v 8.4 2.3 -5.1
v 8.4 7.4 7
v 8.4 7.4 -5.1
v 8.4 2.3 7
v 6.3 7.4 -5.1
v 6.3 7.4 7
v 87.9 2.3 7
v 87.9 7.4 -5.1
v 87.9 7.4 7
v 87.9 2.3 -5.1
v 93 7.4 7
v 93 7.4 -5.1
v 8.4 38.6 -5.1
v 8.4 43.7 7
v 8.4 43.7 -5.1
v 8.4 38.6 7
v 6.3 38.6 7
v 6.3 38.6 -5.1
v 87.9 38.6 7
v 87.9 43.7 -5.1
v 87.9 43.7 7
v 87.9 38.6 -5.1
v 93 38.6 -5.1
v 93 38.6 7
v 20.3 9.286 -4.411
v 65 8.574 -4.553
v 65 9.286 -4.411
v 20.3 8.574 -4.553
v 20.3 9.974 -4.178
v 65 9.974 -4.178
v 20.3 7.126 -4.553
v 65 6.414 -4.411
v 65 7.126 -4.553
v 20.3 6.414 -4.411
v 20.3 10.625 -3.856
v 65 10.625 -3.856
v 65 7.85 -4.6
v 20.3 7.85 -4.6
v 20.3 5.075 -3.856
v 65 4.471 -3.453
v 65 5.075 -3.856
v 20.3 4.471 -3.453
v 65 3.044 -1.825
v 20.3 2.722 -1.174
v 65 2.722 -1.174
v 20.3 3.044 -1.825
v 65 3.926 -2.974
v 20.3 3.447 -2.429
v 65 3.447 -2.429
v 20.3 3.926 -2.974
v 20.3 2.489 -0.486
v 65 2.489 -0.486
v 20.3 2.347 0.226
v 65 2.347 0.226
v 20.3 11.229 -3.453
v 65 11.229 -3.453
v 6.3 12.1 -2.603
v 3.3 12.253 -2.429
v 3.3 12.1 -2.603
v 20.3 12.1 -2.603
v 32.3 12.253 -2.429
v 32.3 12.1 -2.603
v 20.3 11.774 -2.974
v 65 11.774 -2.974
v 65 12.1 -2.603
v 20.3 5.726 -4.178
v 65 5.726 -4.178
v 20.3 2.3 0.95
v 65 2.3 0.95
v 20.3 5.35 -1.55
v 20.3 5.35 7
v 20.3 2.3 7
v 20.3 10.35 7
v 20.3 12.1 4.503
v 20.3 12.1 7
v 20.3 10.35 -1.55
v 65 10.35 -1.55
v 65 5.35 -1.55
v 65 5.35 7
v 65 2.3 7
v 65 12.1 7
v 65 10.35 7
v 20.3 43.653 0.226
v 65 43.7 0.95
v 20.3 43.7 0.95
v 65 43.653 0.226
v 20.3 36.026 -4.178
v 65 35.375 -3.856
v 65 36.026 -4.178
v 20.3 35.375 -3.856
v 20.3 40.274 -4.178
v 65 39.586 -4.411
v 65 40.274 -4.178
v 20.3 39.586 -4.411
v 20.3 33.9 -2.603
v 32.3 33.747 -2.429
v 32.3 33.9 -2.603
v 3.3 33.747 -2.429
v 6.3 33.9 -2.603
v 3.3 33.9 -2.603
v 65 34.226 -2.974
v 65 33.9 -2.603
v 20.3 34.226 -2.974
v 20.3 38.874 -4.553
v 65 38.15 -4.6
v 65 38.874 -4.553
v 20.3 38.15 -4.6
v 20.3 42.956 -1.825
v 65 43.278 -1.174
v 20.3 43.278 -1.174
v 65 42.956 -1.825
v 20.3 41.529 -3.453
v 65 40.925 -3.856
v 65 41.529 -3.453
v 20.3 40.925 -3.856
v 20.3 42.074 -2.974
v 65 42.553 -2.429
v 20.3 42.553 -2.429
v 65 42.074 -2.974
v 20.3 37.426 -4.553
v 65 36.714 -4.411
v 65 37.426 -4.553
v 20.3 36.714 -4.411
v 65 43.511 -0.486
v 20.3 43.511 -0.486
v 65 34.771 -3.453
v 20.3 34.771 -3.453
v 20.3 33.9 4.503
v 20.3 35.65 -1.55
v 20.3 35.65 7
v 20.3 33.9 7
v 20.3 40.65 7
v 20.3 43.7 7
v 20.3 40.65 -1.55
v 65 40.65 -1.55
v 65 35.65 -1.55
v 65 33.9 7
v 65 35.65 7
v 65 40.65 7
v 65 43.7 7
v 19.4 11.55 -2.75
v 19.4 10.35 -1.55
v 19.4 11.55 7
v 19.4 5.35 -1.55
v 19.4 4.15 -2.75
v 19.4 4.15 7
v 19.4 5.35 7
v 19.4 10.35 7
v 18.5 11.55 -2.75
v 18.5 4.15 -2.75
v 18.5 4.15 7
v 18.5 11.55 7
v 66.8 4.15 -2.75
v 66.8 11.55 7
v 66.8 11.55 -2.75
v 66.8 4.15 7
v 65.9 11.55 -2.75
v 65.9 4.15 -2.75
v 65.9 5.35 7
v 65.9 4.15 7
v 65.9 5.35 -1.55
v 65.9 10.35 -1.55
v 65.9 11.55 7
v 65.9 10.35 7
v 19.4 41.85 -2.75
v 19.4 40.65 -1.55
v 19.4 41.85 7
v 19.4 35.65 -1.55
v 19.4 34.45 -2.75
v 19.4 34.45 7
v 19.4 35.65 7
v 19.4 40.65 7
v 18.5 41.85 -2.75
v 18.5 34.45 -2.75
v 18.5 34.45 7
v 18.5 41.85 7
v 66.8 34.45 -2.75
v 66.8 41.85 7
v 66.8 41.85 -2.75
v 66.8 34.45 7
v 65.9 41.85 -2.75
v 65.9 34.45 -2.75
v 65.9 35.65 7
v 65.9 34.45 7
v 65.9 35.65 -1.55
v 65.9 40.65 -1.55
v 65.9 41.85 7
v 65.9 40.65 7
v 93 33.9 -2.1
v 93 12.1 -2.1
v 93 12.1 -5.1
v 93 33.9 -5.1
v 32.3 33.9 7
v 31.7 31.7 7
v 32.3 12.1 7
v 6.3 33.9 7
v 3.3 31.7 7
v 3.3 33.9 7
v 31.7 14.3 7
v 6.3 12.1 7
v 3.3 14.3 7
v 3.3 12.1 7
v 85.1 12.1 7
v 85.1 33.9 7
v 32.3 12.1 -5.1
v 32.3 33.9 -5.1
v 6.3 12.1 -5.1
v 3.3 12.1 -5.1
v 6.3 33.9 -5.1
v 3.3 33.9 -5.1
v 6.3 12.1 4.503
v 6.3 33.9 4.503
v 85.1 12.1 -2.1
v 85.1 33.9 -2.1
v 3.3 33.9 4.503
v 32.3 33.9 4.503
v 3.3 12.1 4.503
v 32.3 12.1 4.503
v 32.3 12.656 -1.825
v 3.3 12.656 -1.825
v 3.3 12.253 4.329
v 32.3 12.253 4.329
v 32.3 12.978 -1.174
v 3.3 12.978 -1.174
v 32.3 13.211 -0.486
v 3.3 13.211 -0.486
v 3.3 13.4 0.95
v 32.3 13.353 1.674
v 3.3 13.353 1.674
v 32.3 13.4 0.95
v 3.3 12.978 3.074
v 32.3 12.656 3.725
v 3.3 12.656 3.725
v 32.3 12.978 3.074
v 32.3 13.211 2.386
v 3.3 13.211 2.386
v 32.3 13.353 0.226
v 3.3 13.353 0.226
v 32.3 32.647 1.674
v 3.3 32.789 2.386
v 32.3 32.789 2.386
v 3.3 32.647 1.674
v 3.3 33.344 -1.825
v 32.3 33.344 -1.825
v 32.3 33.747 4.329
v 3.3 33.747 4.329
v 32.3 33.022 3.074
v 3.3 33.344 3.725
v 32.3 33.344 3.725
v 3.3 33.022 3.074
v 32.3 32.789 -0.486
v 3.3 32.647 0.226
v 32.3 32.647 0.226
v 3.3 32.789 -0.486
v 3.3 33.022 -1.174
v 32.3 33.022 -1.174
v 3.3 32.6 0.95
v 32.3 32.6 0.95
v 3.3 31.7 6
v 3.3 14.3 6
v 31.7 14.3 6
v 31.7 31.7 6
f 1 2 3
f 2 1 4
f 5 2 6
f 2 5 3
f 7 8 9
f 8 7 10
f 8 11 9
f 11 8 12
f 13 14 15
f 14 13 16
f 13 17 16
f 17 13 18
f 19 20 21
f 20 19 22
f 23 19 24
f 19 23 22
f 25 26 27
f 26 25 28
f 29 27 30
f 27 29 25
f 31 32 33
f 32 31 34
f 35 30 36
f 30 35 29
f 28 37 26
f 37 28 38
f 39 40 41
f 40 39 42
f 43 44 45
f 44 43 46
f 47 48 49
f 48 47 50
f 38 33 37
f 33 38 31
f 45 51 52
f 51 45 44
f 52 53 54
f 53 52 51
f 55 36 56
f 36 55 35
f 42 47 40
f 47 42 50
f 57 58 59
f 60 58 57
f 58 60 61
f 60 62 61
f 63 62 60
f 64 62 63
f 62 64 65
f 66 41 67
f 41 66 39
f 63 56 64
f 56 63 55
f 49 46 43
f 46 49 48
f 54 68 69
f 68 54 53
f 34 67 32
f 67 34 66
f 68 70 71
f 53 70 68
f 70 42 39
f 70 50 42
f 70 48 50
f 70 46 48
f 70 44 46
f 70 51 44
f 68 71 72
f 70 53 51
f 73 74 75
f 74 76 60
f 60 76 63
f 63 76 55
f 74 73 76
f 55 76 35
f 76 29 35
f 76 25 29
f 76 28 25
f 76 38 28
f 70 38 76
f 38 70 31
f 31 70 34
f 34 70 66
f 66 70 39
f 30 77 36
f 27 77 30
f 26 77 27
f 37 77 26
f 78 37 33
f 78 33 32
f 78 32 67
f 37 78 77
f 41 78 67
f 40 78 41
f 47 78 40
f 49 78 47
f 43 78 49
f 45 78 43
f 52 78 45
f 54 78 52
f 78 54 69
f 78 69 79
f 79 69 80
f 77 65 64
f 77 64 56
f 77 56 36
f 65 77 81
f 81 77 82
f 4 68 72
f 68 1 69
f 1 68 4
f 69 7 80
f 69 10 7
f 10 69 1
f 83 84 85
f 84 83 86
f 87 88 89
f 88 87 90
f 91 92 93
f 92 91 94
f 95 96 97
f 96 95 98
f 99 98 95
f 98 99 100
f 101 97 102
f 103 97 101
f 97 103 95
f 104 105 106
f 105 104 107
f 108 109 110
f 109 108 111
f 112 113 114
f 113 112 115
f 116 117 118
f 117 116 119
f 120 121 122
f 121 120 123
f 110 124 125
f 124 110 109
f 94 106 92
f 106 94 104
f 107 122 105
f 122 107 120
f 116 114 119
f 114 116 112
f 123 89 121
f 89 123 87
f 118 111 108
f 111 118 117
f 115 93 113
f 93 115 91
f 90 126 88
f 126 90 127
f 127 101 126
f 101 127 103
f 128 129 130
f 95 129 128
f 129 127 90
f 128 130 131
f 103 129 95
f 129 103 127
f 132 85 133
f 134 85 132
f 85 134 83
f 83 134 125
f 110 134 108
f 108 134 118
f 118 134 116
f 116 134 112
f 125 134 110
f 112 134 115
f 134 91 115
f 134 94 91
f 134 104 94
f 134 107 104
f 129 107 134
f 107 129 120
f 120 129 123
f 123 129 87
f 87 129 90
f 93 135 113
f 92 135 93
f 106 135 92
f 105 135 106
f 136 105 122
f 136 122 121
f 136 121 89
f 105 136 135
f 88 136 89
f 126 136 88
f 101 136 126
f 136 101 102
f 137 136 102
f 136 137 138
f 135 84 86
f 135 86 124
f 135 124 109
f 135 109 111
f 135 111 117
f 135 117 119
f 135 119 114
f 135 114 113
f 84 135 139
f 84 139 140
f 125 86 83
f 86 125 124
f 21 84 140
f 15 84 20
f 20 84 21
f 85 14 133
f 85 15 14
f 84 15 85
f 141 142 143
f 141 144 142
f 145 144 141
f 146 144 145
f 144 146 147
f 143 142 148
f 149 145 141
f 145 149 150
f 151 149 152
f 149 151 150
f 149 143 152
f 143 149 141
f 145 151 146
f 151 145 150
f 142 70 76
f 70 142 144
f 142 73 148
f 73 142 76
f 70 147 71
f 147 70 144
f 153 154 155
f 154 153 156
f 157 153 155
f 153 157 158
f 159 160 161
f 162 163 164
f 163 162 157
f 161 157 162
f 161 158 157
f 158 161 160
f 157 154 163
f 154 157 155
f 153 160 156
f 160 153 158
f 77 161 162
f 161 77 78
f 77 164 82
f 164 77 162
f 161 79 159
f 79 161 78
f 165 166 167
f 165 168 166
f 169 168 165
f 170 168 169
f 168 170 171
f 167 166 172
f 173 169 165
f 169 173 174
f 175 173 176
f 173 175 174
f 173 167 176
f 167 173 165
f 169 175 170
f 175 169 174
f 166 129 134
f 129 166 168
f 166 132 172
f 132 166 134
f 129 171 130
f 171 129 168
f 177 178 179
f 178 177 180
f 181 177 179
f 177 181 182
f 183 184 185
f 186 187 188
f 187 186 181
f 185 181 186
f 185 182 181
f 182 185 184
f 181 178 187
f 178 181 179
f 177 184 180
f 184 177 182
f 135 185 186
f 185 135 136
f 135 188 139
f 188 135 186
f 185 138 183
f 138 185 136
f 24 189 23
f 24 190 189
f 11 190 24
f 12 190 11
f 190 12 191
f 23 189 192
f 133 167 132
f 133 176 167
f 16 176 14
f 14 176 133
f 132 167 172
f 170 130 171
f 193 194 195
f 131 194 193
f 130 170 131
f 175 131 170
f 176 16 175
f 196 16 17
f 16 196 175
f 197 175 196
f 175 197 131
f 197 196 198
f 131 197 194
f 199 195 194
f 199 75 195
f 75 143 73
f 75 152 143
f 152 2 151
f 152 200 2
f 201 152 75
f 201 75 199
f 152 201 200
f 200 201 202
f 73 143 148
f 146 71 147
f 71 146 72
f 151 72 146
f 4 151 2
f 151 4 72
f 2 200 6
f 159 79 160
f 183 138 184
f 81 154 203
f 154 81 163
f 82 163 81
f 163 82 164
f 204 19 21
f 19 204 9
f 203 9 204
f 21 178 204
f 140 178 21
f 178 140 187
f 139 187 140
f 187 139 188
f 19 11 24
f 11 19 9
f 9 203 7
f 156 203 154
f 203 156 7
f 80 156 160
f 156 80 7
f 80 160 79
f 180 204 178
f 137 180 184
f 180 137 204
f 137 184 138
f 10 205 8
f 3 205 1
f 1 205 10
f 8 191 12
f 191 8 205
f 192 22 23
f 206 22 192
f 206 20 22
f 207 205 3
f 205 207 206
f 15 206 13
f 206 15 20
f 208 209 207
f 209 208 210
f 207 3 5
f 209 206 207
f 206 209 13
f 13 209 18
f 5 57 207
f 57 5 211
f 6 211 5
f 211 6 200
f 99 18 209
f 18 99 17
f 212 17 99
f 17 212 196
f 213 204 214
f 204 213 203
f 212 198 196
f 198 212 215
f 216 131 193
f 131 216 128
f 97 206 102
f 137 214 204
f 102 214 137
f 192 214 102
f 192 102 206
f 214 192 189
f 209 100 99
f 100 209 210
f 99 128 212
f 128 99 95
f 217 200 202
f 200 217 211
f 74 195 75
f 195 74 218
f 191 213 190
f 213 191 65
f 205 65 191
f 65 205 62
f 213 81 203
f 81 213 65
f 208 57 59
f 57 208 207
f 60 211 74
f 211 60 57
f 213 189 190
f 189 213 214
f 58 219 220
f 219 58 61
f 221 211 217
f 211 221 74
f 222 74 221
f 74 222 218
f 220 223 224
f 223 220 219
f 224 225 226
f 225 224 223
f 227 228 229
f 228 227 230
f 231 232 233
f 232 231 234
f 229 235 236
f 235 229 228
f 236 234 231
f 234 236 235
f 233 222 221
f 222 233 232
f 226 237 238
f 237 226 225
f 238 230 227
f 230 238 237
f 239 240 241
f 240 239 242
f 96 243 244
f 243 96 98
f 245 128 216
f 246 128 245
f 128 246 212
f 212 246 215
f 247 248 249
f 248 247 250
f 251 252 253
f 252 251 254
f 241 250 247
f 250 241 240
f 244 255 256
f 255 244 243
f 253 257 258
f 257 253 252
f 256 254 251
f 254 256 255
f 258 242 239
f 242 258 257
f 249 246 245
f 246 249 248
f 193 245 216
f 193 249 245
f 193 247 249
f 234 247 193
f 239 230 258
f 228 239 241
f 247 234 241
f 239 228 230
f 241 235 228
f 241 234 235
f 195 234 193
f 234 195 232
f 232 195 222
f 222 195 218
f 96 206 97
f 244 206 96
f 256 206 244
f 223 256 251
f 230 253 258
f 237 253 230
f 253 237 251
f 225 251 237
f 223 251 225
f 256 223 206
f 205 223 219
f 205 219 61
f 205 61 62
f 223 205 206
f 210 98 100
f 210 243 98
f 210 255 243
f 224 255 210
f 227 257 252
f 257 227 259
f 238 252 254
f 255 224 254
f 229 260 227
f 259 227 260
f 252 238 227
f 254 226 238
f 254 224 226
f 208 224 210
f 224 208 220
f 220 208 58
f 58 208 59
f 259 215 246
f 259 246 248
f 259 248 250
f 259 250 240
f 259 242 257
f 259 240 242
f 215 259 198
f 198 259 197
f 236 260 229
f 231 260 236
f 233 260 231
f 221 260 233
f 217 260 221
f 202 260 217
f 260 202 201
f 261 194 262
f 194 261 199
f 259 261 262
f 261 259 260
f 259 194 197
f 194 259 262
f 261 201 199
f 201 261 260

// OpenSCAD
// FINAL — AAA CRADLE WITH BATTERY CLIPS (2026-04-29)
//
// Copy of aaa-cradle-with-batt-clips.scad from Working Model Rev 1,
// with the "battery clips first print 04-27 Shortened holes by 5mm
// and opened batt clip window at top" preset values baked in:
//   - aaa_cell_length_mm = 39.5  (was 44.5)
//   - batt_clip_retainer_window_z_extend_up_mm = 4  (was 0.0)
//
// All other values are identical to the parent SCAD.
//
// Fork of aaa-cradle-insert-v1.scad. Defaults are baked from the
// "working insert 4-26-26" preset (matched the existing constants
// exactly — no value changes vs parent SCAD). The new feature is
// 4 vertical drop-in slots sized for the smallest Swpeet 1.5V AAA
// battery contact plate (unipolar, 7 x 7 mm stamped sheet metal),
// one at each X end of each AAA bay.
//
// How the slots are used:
//   - Each plate drops in from the plug top face into a 7.4 x 7.4 mm
//     pocket, plate face perpendicular to the cell axis.
//   - The pocket is 0.9 mm thick along X (plate ~0.5 mm + 0.2 mm slop
//     per edge), so the plate is press-fit / friction-held by its own
//     thickness.
//   - The pocket extends from cell-axis level up to the plug top so
//     wires can exit upward and the plate is droppable post-print.
//   - Spring side faces INTO the bay; the cell pushes the plate's
//     contact face axially. Solder a wire to the plate's outer face
//     before insertion.
//
// Note: only unipolar plates are used (4 total = 2 bays x 2 ends).
// Wire the cells in PARALLEL — never in series, since 2S 10440 = 7.4 V
// would exceed the Pico W's 5.5 V VSYS max.
//
// Export:
//   openscad -o aaa-cradle-final.3mf aaa-cradle-final.scad

$fn = 48;

// ============================================================
// Match the cover / base shell parameters
// ============================================================
enclosure_outer_width_along_x_axis_mm          = 94.5;   // was 91.5 — +3 mm on -X side for TP4056
enclosure_outer_depth_along_y_axis_mm          = 46;
minus_x_end_wall_thickness_mm                  = 3.0;
plus_x_end_wall_thickness_mm                   = 1.2;
perimeter_long_side_wall_thickness_y_mm_base   = 2;
corner_pillar_square_side_length_mm            = 5;

// Cover cavity inner bounds (the space the plug fills)
cavity_inner_x_start_mm = minus_x_end_wall_thickness_mm;                         // = 3.0
cavity_inner_x_end_mm =
    enclosure_outer_width_along_x_axis_mm
      - plus_x_end_wall_thickness_mm;                                            // = 93.3
cavity_inner_y_start_mm = perimeter_long_side_wall_thickness_y_mm_base;          // = 2.0
cavity_inner_y_end_mm =
    enclosure_outer_depth_along_y_axis_mm
      - perimeter_long_side_wall_thickness_y_mm_base;                            // = 44.0

// Plug outer footprint = cavity − a tiny slide-in slop on every wall.
plug_wall_slop_mm                              = 0.3;
plug_x_start_mm = cavity_inner_x_start_mm + plug_wall_slop_mm;                   // = 3.3
plug_x_end_mm   = cavity_inner_x_end_mm   - plug_wall_slop_mm;                   // = 93.0
plug_y_start_mm = cavity_inner_y_start_mm + plug_wall_slop_mm;                   // = 2.3
plug_y_end_mm   = cavity_inner_y_end_mm   - plug_wall_slop_mm;                   // = 43.7

// ============================================================
// Plug Z
// ============================================================
face_plate_bottom_z_in_cover_local_mm          = 7;
aaa_cell_diameter_mm                           = 10.5;
aaa_cell_radial_slop_mm                        = 0.3;
aaa_bay_diameter_mm =
    aaa_cell_diameter_mm + 2 * aaa_cell_radial_slop_mm;  // = 11.1
aaa_bay_wall_above_and_below_mm                = 0.5;

plug_thickness_mm =
    aaa_bay_diameter_mm + 2 * aaa_bay_wall_above_and_below_mm;  // = 12.1
plug_top_z_mm = face_plate_bottom_z_in_cover_local_mm;          // = 7
plug_bottom_z_mm = plug_top_z_mm - plug_thickness_mm;           // = -5.1

// ============================================================
// AAA cells — 2 cells lying along X, stacked in Y
// ============================================================
aaa_cell_length_mm                             = 39.5;   // BAKED: was 44.5 — shortened 5 mm for 04-27 print
aaa_cell_axial_slop_mm                         = 1.0;
aaa_cell_contact_space_per_end_mm              = 2.0;
aaa_bay_length_along_x_mm =
    aaa_cell_length_mm
      + 2 * aaa_cell_contact_space_per_end_mm
      + aaa_cell_axial_slop_mm;                          // = 44.5

plus_x_pillar_cutout_minus_x_edge_mm =
    (enclosure_outer_width_along_x_axis_mm
       - plus_x_end_wall_thickness_mm
       - corner_pillar_square_side_length_mm)
      - 0.4;                                              // = 87.9
aaa_bay_gap_from_pillar_cutout_mm              = 3.0;
aaa_bay_shift_toward_minus_x_mm               = 20;      // shift bays 20 mm toward origin
aaa_bay_plus_x_end_mm =
    plus_x_pillar_cutout_minus_x_edge_mm
      - aaa_bay_gap_from_pillar_cutout_mm
      - aaa_bay_shift_toward_minus_x_mm;                  // = 69.9
aaa_bay_minus_x_start_mm =
    aaa_bay_plus_x_end_mm - aaa_bay_length_along_x_mm;   // = 25.4

aaa_bay_minus_y_center_y_mm =
    plug_y_start_mm + aaa_bay_diameter_mm / 2;            // = 7.85
aaa_bay_plus_y_center_y_mm =
    plug_y_end_mm - aaa_bay_diameter_mm / 2;              // = 38.15
aaa_bay_center_z_mm =
    (plug_top_z_mm + plug_bottom_z_mm) / 2;               // ≈ 0.95

aaa_bay_top_open_z_bottom_mm                   = aaa_bay_center_z_mm;
aaa_bay_top_open_z_top_mm                      = plug_top_z_mm + 0.1;

// ============================================================
// Battery contact-plate slots — Swpeet 1.5 V AAA battery spring kit,
// smallest unipolar plate (7 × 7 mm stamped sheet metal). Four slots
// total (2 bays × 2 ends). Plates drop in from above; wires exit
// through the top of the slot.
//
// Slot orientation: plate sits in the YZ plane, perpendicular to the
// cell axis. Plate face flush with the bay's X end. Slot is centered
// on the bay Y center and on the cell axis Z.
// ============================================================
batt_clip_plate_size_y_mm                      = 7.0;     // smallest Swpeet unipolar plate
batt_clip_plate_size_z_mm                      = 7.0;     // smallest Swpeet unipolar plate
batt_clip_plate_thickness_x_mm                 = 0.5;     // sheet metal thickness
batt_clip_slot_slop_per_edge_mm                = 0.2;     // print tolerance per edge

batt_clip_slot_y_size_mm =
    batt_clip_plate_size_y_mm + 2 * batt_clip_slot_slop_per_edge_mm;            // = 7.4
batt_clip_slot_x_size_mm =
    batt_clip_plate_thickness_x_mm + 2 * batt_clip_slot_slop_per_edge_mm;       // = 0.9
batt_clip_slot_z_bottom_mm =
    aaa_bay_center_z_mm
      - batt_clip_plate_size_z_mm / 2
      - batt_clip_slot_slop_per_edge_mm;                                         // ≈ -2.75
batt_clip_slot_z_top_mm                        = plug_top_z_mm + 0.1;            // = 7.1

// ============================================================
// Battery clip retainer wall — keeps the contact plate from
// sliding INTO the bay (toward the cell). Thin wall sits on the
// cell side of each clip slot, with a smaller central window so
// the plate's edges are caught but the contact face stays exposed.
//
// Implementation: the slot is pulled back from the bay end by
// `batt_clip_retainer_thickness_x_mm`, leaving body material as
// the wall. A rectangular window is then cut through that wall.
// Window must be smaller than the plate (Y/Z) so the wall catches
// the plate's perimeter — defaults give a 1 mm ring of engagement
// on all sides of a 7 × 7 mm plate.
//
// Set `batt_clip_retainer_enabled = false` to fall back to the
// original through-slot (no wall, plate can slide into bay).
// ============================================================
batt_clip_retainer_enabled                     = true;
batt_clip_retainer_thickness_x_mm              = 1.0;
batt_clip_retainer_window_size_y_mm            = 5.0;     // < plate Y so wall catches edges
batt_clip_retainer_window_size_z_mm            = 5.0;     // < plate Z
batt_clip_retainer_window_z_extend_up_mm       = 4;       // BAKED: was 0.0 — opened batt clip window at top for 04-27 print

// ============================================================
// FPC gap
// ============================================================
fpc_gap_width_along_x_mm                       = 3;

// ============================================================
// Pico nest
// ============================================================
pico_w_board_width_along_y_mm                  = 21.0;
pico_w_board_length_along_x_mm                 = 78;   // was 61 — nest extends to x≈87.3 for 55 mm past connecting block
print_fit_tolerance_slop_mm                    = 0.4;
pico_nest_width_along_y_mm =
    pico_w_board_width_along_y_mm + 2 * print_fit_tolerance_slop_mm;              // = 21.8
pico_nest_length_along_x_mm =
    pico_w_board_length_along_x_mm + 2 * print_fit_tolerance_slop_mm;             // = 61.8
pico_nest_depth_along_z_mm                     = plug_thickness_mm;

pico_nest_x_region_start_mm =
    plug_x_start_mm + fpc_gap_width_along_x_mm;                                   // = 6.3
pico_nest_x_region_end_mm   = aaa_bay_minus_x_start_mm;                           // = 35.4
pico_nest_x_start_mm =
    (pico_nest_x_region_start_mm + pico_nest_x_region_end_mm) / 2
      - pico_nest_length_along_x_mm / 2;
pico_nest_x_start_clamped_mm =
    max(pico_nest_x_start_mm, pico_nest_x_region_start_mm);
pico_nest_y_start_mm =
    enclosure_outer_depth_along_y_axis_mm / 2
      - pico_nest_width_along_y_mm / 2;                                           // = 12.1

// ============================================================
// -X middle inset — extended to 29 mm / full height for TP4056
// ============================================================
minus_x_inset_length_along_x_mm                = 29;
minus_x_inset_height_reduction_from_plug_mm    = 0;
minus_x_inset_depth_along_z_mm =
    plug_thickness_mm - minus_x_inset_height_reduction_from_plug_mm;
minus_x_inset_x_start_mm                       = plug_x_start_mm;
minus_x_inset_x_end_mm =
    minus_x_inset_x_start_mm + minus_x_inset_length_along_x_mm;
minus_x_inset_y_start_mm                       = pico_nest_y_start_mm;
minus_x_inset_y_end_mm =
    minus_x_inset_y_start_mm + pico_nest_width_along_y_mm;
minus_x_inset_z_top_mm                         = plug_top_z_mm;
minus_x_inset_z_bottom_mm =
    minus_x_inset_z_top_mm - minus_x_inset_depth_along_z_mm;

// ============================================================
// Connecting block — fills the -X inset, 29 mm X / full height
// ============================================================
connecting_block_length_along_x_mm             = 29;
connecting_block_height_reduction_from_plug_mm = 0;
connecting_block_height_along_z_mm =
    plug_thickness_mm - connecting_block_height_reduction_from_plug_mm;
connecting_block_x_start_mm                    = minus_x_inset_x_start_mm;
connecting_block_x_end_mm =
    connecting_block_x_start_mm + connecting_block_length_along_x_mm;
connecting_block_y_start_mm                    = minus_x_inset_y_start_mm;
connecting_block_y_end_mm                      = minus_x_inset_y_end_mm;
connecting_block_z_top_mm                      = plug_top_z_mm;
connecting_block_z_bottom_mm =
    connecting_block_z_top_mm - connecting_block_height_along_z_mm;

// ============================================================
// TP4056 indent — 1 mm recess on connecting block top face
// ============================================================
tp4056_board_length_along_x_mm                 = 28;
tp4056_board_width_along_y_mm                  = 17;
tp4056_indent_depth_z_mm                       = 1.0;
tp4056_indent_slop_per_edge_mm                 = 0.2;

tp4056_indent_x_start_mm                       = connecting_block_x_start_mm;
tp4056_indent_length_mm =
    tp4056_board_length_along_x_mm + 2 * tp4056_indent_slop_per_edge_mm;
tp4056_indent_width_mm =
    tp4056_board_width_along_y_mm + 2 * tp4056_indent_slop_per_edge_mm;
tp4056_indent_y_start_mm =
    (connecting_block_y_start_mm + connecting_block_y_end_mm) / 2
      - tp4056_indent_width_mm / 2;
tp4056_indent_z_bottom_mm =
    plug_top_z_mm - tp4056_indent_depth_z_mm;

// ============================================================
// +X display connector cutout — 3 mm from bottom face
// ============================================================
plus_x_cutout_depth_z_mm                       = 3;
plus_x_cutout_z_bottom_mm                      = plug_bottom_z_mm;
plus_x_cutout_z_top_mm =
    plug_bottom_z_mm + plus_x_cutout_depth_z_mm;
plus_x_cutout_x_start_mm                       = aaa_bay_plus_x_end_mm;
plus_x_cutout_x_end_mm                         = plug_x_end_mm;

// ============================================================
// Corner pillar cutouts
// ============================================================
corner_pillar_cutout_slop_mm                   = 0.4;
corner_pillar_cutout_xy_positions = [
    [minus_x_end_wall_thickness_mm,
     perimeter_long_side_wall_thickness_y_mm_base],
    [enclosure_outer_width_along_x_axis_mm
       - plus_x_end_wall_thickness_mm
       - corner_pillar_square_side_length_mm,
     perimeter_long_side_wall_thickness_y_mm_base],
    [minus_x_end_wall_thickness_mm,
     enclosure_outer_depth_along_y_axis_mm
       - perimeter_long_side_wall_thickness_y_mm_base
       - corner_pillar_square_side_length_mm],
    [enclosure_outer_width_along_x_axis_mm
       - plus_x_end_wall_thickness_mm
       - corner_pillar_square_side_length_mm,
     enclosure_outer_depth_along_y_axis_mm
       - perimeter_long_side_wall_thickness_y_mm_base
       - corner_pillar_square_side_length_mm],
];


// ========== Battery clip slot helper ==========

// Drops a thin YZ slot at the X-end of a bay, sized for a Swpeet
// unipolar contact plate. is_plus_x_end = true puts the slot just
// outside the bay on the +X side; false on the -X side. The slot
// extends upward to plug_top so plates drop in from above.
//
// When `batt_clip_retainer_enabled` is true, the slot is pulled
// further from the bay by `batt_clip_retainer_thickness_x_mm` to
// leave a wall of body material between slot and bay; a smaller
// rectangular contact window is then cut through that wall.
module batt_clip_slot(bay_y_center_mm, bay_x_end_mm, is_plus_x_end) {
    retainer_thickness_mm =
        batt_clip_retainer_enabled ? batt_clip_retainer_thickness_x_mm : 0;

    slot_x_start =
        is_plus_x_end
          ? bay_x_end_mm + retainer_thickness_mm
          : bay_x_end_mm - batt_clip_slot_x_size_mm - retainer_thickness_mm;
    slot_y_start = bay_y_center_mm - batt_clip_slot_y_size_mm / 2;
    translate([slot_x_start, slot_y_start, batt_clip_slot_z_bottom_mm])
        cube([batt_clip_slot_x_size_mm,
              batt_clip_slot_y_size_mm,
              batt_clip_slot_z_top_mm - batt_clip_slot_z_bottom_mm]);

    // Contact window through the retainer wall. Window punches from
    // the slot's bay-facing side through to the bay cylinder, smaller
    // than the plate so a perimeter ring of wall remains to catch it.
    if (batt_clip_retainer_enabled) {
        window_x_start =
            is_plus_x_end
              ? bay_x_end_mm - 0.1
              : bay_x_end_mm - retainer_thickness_mm - 0.1;
        window_y_start =
            bay_y_center_mm - batt_clip_retainer_window_size_y_mm / 2;
        window_z_start =
            aaa_bay_center_z_mm - batt_clip_retainer_window_size_z_mm / 2;
        window_z_total =
            batt_clip_retainer_window_size_z_mm + batt_clip_retainer_window_z_extend_up_mm;
        translate([window_x_start, window_y_start, window_z_start])
            cube([retainer_thickness_mm + 0.2,
                  batt_clip_retainer_window_size_y_mm,
                  window_z_total]);
    }
}


// ========== AAA cradle insert ==========

module aaa_cradle_insert() {
    union() {
    difference() {
        // Main plug body
        translate([plug_x_start_mm, plug_y_start_mm, plug_bottom_z_mm])
            cube([plug_x_end_mm - plug_x_start_mm,
                  plug_y_end_mm - plug_y_start_mm,
                  plug_thickness_mm]);

        // Corner pillar cutouts (4)
        for (xy = corner_pillar_cutout_xy_positions) {
            translate([xy[0] - corner_pillar_cutout_slop_mm,
                       xy[1] - corner_pillar_cutout_slop_mm,
                       plug_bottom_z_mm - 0.1])
                cube([corner_pillar_square_side_length_mm + 2 * corner_pillar_cutout_slop_mm,
                      corner_pillar_square_side_length_mm + 2 * corner_pillar_cutout_slop_mm,
                      plug_thickness_mm + 0.2]);
        }

        // FPC gap
        translate([plug_x_start_mm - 0.1,
                   plug_y_start_mm - 0.1,
                   plug_bottom_z_mm - 0.1])
            cube([fpc_gap_width_along_x_mm + 0.1,
                  plug_y_end_mm - plug_y_start_mm + 0.2,
                  plug_thickness_mm + 0.2]);

        // AAA cell bays
        for (bay_y_center_mm = [aaa_bay_minus_y_center_y_mm,
                                aaa_bay_plus_y_center_y_mm]) {
            translate([aaa_bay_minus_x_start_mm - 0.1,
                       bay_y_center_mm,
                       aaa_bay_center_z_mm])
                rotate([0, 90, 0])
                    cylinder(h = aaa_bay_length_along_x_mm + 0.2,
                             d = aaa_bay_diameter_mm);

            bay_y_start_mm = bay_y_center_mm - aaa_bay_diameter_mm / 2;
            translate([aaa_bay_minus_x_start_mm - 0.1,
                       bay_y_start_mm,
                       aaa_bay_top_open_z_bottom_mm])
                cube([aaa_bay_length_along_x_mm + 0.2,
                      aaa_bay_diameter_mm,
                      aaa_bay_top_open_z_top_mm - aaa_bay_top_open_z_bottom_mm]);
        }

        // Battery contact-plate slots — 4 total (2 bays × 2 ends)
        for (bay_y_center_mm = [aaa_bay_minus_y_center_y_mm,
                                aaa_bay_plus_y_center_y_mm]) {
            batt_clip_slot(bay_y_center_mm, aaa_bay_minus_x_start_mm, false);
            batt_clip_slot(bay_y_center_mm, aaa_bay_plus_x_end_mm, true);
        }

        // Pico nest
        translate([pico_nest_x_start_clamped_mm,
                   pico_nest_y_start_mm,
                   plug_bottom_z_mm - 0.1])
            cube([pico_nest_length_along_x_mm,
                  pico_nest_width_along_y_mm,
                  plug_thickness_mm + 0.2]);

        // -X middle inset
        translate([minus_x_inset_x_start_mm,
                   minus_x_inset_y_start_mm,
                   minus_x_inset_z_bottom_mm])
            cube([minus_x_inset_x_end_mm - minus_x_inset_x_start_mm,
                  minus_x_inset_y_end_mm - minus_x_inset_y_start_mm,
                  minus_x_inset_z_top_mm - minus_x_inset_z_bottom_mm + 0.1]);

        // +X display connector cutout — 3 mm from bottom face
        translate([plus_x_cutout_x_start_mm,
                   pico_nest_y_start_mm,
                   plus_x_cutout_z_bottom_mm - 0.1])
            cube([plus_x_cutout_x_end_mm - plus_x_cutout_x_start_mm + 0.1,
                  pico_nest_width_along_y_mm,
                  plus_x_cutout_depth_z_mm + 0.1]);
    }

    // Connecting block with battery arcs and TP4056 indent
    difference() {
        translate([connecting_block_x_start_mm,
                   connecting_block_y_start_mm,
                   connecting_block_z_bottom_mm])
            cube([connecting_block_x_end_mm - connecting_block_x_start_mm,
                  connecting_block_y_end_mm - connecting_block_y_start_mm,
                  connecting_block_z_top_mm - connecting_block_z_bottom_mm]);

        // Concave battery arcs on ±Y faces
        for (bay_y_center = [aaa_bay_minus_y_center_y_mm,
                             aaa_bay_plus_y_center_y_mm]) {
            translate([connecting_block_x_start_mm - 0.1,
                       bay_y_center,
                       aaa_bay_center_z_mm])
                rotate([0, 90, 0])
                    cylinder(h = connecting_block_x_end_mm
                                   - connecting_block_x_start_mm + 0.2,
                             r = aaa_bay_diameter_mm / 2);
        }

        // TP4056 indent
        translate([tp4056_indent_x_start_mm,
                   tp4056_indent_y_start_mm,
                   tp4056_indent_z_bottom_mm])
            cube([tp4056_indent_length_mm,
                  tp4056_indent_width_mm,
                  tp4056_indent_depth_z_mm + 0.1]);
    }
    }
}

aaa_cradle_insert();
